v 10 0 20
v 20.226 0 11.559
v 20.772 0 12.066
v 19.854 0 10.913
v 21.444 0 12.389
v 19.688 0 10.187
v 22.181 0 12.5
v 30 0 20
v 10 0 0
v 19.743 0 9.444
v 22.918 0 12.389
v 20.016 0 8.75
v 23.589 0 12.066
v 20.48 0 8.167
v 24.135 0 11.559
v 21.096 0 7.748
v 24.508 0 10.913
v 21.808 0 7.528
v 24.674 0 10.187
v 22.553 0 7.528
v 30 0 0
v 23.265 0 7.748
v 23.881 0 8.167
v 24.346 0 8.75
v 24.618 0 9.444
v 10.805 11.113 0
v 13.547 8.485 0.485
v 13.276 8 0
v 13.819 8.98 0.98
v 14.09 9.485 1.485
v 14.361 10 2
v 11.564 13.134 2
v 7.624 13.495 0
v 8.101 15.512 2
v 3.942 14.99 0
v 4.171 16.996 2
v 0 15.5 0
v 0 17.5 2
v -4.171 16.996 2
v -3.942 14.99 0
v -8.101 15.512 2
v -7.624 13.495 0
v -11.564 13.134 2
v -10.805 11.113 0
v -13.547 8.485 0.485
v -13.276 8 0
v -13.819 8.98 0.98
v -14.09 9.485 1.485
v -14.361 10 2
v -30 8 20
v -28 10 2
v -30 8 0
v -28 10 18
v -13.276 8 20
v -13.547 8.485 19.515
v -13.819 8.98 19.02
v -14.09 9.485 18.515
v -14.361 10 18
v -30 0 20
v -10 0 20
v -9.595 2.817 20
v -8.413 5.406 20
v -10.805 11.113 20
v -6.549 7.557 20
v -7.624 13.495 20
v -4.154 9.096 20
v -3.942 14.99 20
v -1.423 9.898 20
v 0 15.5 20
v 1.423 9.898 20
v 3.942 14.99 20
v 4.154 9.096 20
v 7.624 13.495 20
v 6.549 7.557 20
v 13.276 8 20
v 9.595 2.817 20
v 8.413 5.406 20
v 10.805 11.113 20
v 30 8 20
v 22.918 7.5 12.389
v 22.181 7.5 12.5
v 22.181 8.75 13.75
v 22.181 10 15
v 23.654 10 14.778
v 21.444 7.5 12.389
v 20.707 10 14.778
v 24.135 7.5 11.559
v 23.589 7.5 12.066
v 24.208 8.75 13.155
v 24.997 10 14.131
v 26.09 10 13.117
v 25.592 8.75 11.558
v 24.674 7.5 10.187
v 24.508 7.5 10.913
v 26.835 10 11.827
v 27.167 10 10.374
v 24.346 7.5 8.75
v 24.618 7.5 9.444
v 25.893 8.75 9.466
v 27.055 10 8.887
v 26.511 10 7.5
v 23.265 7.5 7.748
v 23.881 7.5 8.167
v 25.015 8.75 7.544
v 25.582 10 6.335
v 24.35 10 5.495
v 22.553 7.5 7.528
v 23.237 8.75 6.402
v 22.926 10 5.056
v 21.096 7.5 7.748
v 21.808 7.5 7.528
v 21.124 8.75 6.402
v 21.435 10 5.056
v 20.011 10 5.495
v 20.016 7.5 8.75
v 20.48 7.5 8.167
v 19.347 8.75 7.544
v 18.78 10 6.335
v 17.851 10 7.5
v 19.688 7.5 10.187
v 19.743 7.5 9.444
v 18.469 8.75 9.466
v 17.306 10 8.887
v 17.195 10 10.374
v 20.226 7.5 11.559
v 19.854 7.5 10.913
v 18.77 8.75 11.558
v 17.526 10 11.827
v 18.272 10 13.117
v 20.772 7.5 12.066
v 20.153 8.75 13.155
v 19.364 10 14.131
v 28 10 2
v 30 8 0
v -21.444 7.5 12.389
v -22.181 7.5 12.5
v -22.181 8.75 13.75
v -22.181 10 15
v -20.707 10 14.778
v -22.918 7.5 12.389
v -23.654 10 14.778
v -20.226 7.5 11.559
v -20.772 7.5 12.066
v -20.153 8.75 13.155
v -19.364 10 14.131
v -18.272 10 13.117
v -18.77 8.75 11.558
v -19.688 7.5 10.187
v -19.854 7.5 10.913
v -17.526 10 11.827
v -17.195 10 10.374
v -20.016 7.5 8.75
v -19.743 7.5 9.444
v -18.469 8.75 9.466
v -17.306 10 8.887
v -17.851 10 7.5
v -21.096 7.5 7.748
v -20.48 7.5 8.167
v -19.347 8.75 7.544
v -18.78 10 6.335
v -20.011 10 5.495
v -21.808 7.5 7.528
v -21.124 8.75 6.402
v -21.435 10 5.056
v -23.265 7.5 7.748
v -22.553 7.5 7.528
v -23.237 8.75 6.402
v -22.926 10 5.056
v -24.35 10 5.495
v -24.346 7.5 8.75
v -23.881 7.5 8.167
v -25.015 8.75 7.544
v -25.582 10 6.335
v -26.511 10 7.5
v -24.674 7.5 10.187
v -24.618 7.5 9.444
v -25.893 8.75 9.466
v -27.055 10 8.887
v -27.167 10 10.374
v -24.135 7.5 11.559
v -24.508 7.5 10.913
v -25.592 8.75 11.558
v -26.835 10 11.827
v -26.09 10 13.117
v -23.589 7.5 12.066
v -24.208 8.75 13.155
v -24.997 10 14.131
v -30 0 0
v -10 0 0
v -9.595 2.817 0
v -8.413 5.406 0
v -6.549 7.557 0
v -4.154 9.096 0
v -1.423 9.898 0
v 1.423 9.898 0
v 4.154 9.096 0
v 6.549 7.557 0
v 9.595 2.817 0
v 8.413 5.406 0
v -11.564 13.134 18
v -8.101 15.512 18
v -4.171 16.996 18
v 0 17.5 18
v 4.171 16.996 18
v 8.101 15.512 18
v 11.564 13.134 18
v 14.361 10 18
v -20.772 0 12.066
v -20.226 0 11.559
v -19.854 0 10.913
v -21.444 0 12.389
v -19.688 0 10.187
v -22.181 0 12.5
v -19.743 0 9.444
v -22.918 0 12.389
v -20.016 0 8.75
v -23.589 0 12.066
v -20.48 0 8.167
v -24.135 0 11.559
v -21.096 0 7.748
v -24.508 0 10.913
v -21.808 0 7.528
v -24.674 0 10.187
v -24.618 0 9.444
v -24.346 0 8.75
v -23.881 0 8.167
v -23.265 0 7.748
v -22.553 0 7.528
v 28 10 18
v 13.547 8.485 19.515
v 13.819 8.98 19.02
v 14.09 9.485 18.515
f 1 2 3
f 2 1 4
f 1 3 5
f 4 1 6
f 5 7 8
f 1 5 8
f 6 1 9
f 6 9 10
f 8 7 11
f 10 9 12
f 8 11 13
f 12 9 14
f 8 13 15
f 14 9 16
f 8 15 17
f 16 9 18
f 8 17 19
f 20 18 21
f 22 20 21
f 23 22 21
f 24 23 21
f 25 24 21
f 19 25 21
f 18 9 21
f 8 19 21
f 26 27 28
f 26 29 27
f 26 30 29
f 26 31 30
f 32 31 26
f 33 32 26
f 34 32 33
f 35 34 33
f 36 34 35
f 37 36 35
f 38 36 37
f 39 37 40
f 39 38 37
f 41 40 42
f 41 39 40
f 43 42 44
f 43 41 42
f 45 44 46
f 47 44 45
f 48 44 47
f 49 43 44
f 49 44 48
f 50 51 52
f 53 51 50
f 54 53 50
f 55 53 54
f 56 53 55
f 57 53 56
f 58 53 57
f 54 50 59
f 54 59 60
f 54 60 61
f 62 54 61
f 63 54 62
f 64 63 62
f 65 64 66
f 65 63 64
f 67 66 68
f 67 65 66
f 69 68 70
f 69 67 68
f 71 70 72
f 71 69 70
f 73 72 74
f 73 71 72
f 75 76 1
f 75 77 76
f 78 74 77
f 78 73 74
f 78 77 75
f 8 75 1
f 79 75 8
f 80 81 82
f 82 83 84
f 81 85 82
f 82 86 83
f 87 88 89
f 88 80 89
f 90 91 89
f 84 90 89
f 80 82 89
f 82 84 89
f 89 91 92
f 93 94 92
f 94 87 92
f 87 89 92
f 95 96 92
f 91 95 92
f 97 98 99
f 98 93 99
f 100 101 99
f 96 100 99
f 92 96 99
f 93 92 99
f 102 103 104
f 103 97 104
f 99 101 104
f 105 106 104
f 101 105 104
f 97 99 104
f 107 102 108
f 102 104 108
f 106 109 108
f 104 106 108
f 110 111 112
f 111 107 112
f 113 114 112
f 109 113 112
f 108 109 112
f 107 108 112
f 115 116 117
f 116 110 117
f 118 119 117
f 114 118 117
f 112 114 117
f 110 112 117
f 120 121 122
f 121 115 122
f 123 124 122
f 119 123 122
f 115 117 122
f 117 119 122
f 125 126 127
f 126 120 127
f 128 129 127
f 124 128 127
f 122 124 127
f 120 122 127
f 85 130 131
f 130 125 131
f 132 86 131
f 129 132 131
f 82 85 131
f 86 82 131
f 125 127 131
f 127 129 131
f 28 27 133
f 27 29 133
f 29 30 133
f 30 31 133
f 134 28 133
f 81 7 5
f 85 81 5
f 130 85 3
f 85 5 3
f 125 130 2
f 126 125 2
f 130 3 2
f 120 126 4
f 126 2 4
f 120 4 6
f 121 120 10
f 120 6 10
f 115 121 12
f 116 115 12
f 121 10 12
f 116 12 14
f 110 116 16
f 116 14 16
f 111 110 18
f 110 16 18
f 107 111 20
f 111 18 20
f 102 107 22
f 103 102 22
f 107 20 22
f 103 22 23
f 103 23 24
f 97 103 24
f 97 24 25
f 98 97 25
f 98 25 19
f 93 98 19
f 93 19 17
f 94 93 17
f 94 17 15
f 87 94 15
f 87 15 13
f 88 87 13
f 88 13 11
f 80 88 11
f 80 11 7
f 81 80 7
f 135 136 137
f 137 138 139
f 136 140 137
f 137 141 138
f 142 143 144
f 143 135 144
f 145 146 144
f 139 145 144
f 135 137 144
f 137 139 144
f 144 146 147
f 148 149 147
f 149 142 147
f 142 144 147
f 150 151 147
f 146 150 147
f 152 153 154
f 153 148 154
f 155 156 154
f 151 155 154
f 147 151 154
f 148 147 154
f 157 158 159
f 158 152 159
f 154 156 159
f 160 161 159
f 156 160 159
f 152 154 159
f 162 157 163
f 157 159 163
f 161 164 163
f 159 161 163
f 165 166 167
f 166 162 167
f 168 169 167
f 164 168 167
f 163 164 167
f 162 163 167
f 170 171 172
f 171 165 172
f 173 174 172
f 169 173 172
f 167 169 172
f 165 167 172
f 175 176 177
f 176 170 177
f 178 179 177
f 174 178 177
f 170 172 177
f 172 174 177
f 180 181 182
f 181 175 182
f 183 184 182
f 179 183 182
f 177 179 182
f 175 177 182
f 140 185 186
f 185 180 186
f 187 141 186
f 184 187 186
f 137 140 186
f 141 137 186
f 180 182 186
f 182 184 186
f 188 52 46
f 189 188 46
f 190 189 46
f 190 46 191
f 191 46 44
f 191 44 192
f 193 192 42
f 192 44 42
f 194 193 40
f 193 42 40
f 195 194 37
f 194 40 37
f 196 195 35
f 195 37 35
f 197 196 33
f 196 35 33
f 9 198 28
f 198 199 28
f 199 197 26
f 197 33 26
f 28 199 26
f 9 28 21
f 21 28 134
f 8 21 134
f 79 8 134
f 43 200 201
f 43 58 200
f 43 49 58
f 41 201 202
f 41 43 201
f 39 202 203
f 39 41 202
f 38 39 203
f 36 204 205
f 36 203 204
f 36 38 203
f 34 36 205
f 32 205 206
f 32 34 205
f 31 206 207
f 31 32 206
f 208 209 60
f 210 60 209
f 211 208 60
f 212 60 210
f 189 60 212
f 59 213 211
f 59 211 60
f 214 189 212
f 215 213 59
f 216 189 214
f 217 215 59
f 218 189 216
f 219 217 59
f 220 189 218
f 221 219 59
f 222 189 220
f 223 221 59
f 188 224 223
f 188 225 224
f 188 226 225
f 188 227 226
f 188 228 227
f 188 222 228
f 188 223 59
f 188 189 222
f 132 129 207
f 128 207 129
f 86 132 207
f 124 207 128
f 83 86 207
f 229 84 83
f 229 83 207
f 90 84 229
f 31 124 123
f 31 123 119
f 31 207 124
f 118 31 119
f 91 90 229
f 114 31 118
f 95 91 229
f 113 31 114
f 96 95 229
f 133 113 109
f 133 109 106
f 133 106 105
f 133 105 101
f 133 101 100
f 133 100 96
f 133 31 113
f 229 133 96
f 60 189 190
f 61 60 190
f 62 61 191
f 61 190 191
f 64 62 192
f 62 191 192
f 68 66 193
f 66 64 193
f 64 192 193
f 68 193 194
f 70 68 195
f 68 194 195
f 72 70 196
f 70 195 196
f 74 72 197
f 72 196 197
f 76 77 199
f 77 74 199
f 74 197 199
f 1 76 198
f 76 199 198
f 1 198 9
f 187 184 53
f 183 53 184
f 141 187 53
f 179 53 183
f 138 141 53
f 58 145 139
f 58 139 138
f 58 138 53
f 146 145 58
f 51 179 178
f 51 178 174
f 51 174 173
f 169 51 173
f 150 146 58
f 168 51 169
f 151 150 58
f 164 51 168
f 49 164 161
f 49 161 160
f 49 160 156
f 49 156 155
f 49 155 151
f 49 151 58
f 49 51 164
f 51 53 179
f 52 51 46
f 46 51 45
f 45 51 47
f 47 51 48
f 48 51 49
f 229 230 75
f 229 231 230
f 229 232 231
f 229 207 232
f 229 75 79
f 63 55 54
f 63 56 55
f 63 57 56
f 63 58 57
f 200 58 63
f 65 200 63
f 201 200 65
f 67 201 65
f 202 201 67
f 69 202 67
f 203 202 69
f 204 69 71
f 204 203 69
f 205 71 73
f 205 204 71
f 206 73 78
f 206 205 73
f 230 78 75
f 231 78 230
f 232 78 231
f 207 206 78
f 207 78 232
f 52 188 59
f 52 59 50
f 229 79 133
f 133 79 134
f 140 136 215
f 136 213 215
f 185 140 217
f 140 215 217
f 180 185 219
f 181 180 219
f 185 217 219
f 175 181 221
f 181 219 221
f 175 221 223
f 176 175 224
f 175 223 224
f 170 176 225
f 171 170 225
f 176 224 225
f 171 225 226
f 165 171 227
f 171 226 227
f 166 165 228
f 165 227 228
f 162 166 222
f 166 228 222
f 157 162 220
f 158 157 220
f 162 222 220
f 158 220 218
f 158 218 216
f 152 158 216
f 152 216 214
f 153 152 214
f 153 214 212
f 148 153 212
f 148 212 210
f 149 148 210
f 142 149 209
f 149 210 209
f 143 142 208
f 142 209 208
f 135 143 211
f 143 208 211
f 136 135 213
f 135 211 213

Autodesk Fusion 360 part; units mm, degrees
sketch "Sketch1" plane through (0, 0, 0) normal (0, 0, 1) x (1, 0, 0)
  line L0 (-10, 0) -> (-30, 0)
  line L1 (10, 0) -> (30, 0)
  line L2 (-30, 0) -> (-30, 10)
  line L3 (30, 0) -> (30, 10)
  arc A0 (14.3614, 10) -> (-14.3614, 10) centre (0, 0) ccw
  line L4 (-30, 10) -> (-14.3614, 10)
  line L5 (14.3614, 10) -> (30, 10)
  arc A1 (10, 0) -> (-10, 0) centre (0, 0) ccw
  dimension "d1" = 20
  dimension "d2" = 35
extrude "Extrude1" add sketch "Sketch1" along normal blind 20
sketch "Sketch2" plane through (0, 10, 0) normal (0, 1, 0) x (-1, 0, 0)
  line L0 (-30, 0) -> (-14.3614, 0)
  line L1 (-14.3614, 0) -> (-14.3614, 20)
  line L2 (-14.3614, 20) -> (-30, 20)
  line L3 (-30, 20) -> (-30, 0)
  line L4 (-30, 20) -> (-14.3614, 0)
  line L5 (-14.3614, 20) -> (-30, 0)
hole "Hole1" at (22.1807, 10, 10) direction (0, -1, 0) diameter 5 depth 10 tip angle 118 countersink diameter 10 countersink angle 90
sketch "Sketch3" plane through (0, 10, 0) normal (0, 1, 0) x (-1, 0, 0)
  line L0 (14.3614, 0) -> (30, 0)
  line L1 (30, 0) -> (30, 20)
  line L2 (30, 20) -> (14.3614, 20)
  line L3 (14.3614, 20) -> (14.3614, 0)
  line L4 (14.3614, 20) -> (30, 0)
  line L5 (14.3614, 0) -> (30, 20)
hole "Hole2" at (-22.1807, 10, 10) direction (0, -1, 0) diameter 5 depth 10 tip angle 118 countersink diameter 10 countersink angle 90
chamfer "Chamfer1" distance 2 angle 45 8 edges at (-30, 10, 10) (30, 10, 10) (22.1807, 10, 0) (-22.1807, 10, 0) (-22.1807, 10, 20) (22.1807, 10, 20) (0, 17.5, 20) (0, 17.5, 0)
